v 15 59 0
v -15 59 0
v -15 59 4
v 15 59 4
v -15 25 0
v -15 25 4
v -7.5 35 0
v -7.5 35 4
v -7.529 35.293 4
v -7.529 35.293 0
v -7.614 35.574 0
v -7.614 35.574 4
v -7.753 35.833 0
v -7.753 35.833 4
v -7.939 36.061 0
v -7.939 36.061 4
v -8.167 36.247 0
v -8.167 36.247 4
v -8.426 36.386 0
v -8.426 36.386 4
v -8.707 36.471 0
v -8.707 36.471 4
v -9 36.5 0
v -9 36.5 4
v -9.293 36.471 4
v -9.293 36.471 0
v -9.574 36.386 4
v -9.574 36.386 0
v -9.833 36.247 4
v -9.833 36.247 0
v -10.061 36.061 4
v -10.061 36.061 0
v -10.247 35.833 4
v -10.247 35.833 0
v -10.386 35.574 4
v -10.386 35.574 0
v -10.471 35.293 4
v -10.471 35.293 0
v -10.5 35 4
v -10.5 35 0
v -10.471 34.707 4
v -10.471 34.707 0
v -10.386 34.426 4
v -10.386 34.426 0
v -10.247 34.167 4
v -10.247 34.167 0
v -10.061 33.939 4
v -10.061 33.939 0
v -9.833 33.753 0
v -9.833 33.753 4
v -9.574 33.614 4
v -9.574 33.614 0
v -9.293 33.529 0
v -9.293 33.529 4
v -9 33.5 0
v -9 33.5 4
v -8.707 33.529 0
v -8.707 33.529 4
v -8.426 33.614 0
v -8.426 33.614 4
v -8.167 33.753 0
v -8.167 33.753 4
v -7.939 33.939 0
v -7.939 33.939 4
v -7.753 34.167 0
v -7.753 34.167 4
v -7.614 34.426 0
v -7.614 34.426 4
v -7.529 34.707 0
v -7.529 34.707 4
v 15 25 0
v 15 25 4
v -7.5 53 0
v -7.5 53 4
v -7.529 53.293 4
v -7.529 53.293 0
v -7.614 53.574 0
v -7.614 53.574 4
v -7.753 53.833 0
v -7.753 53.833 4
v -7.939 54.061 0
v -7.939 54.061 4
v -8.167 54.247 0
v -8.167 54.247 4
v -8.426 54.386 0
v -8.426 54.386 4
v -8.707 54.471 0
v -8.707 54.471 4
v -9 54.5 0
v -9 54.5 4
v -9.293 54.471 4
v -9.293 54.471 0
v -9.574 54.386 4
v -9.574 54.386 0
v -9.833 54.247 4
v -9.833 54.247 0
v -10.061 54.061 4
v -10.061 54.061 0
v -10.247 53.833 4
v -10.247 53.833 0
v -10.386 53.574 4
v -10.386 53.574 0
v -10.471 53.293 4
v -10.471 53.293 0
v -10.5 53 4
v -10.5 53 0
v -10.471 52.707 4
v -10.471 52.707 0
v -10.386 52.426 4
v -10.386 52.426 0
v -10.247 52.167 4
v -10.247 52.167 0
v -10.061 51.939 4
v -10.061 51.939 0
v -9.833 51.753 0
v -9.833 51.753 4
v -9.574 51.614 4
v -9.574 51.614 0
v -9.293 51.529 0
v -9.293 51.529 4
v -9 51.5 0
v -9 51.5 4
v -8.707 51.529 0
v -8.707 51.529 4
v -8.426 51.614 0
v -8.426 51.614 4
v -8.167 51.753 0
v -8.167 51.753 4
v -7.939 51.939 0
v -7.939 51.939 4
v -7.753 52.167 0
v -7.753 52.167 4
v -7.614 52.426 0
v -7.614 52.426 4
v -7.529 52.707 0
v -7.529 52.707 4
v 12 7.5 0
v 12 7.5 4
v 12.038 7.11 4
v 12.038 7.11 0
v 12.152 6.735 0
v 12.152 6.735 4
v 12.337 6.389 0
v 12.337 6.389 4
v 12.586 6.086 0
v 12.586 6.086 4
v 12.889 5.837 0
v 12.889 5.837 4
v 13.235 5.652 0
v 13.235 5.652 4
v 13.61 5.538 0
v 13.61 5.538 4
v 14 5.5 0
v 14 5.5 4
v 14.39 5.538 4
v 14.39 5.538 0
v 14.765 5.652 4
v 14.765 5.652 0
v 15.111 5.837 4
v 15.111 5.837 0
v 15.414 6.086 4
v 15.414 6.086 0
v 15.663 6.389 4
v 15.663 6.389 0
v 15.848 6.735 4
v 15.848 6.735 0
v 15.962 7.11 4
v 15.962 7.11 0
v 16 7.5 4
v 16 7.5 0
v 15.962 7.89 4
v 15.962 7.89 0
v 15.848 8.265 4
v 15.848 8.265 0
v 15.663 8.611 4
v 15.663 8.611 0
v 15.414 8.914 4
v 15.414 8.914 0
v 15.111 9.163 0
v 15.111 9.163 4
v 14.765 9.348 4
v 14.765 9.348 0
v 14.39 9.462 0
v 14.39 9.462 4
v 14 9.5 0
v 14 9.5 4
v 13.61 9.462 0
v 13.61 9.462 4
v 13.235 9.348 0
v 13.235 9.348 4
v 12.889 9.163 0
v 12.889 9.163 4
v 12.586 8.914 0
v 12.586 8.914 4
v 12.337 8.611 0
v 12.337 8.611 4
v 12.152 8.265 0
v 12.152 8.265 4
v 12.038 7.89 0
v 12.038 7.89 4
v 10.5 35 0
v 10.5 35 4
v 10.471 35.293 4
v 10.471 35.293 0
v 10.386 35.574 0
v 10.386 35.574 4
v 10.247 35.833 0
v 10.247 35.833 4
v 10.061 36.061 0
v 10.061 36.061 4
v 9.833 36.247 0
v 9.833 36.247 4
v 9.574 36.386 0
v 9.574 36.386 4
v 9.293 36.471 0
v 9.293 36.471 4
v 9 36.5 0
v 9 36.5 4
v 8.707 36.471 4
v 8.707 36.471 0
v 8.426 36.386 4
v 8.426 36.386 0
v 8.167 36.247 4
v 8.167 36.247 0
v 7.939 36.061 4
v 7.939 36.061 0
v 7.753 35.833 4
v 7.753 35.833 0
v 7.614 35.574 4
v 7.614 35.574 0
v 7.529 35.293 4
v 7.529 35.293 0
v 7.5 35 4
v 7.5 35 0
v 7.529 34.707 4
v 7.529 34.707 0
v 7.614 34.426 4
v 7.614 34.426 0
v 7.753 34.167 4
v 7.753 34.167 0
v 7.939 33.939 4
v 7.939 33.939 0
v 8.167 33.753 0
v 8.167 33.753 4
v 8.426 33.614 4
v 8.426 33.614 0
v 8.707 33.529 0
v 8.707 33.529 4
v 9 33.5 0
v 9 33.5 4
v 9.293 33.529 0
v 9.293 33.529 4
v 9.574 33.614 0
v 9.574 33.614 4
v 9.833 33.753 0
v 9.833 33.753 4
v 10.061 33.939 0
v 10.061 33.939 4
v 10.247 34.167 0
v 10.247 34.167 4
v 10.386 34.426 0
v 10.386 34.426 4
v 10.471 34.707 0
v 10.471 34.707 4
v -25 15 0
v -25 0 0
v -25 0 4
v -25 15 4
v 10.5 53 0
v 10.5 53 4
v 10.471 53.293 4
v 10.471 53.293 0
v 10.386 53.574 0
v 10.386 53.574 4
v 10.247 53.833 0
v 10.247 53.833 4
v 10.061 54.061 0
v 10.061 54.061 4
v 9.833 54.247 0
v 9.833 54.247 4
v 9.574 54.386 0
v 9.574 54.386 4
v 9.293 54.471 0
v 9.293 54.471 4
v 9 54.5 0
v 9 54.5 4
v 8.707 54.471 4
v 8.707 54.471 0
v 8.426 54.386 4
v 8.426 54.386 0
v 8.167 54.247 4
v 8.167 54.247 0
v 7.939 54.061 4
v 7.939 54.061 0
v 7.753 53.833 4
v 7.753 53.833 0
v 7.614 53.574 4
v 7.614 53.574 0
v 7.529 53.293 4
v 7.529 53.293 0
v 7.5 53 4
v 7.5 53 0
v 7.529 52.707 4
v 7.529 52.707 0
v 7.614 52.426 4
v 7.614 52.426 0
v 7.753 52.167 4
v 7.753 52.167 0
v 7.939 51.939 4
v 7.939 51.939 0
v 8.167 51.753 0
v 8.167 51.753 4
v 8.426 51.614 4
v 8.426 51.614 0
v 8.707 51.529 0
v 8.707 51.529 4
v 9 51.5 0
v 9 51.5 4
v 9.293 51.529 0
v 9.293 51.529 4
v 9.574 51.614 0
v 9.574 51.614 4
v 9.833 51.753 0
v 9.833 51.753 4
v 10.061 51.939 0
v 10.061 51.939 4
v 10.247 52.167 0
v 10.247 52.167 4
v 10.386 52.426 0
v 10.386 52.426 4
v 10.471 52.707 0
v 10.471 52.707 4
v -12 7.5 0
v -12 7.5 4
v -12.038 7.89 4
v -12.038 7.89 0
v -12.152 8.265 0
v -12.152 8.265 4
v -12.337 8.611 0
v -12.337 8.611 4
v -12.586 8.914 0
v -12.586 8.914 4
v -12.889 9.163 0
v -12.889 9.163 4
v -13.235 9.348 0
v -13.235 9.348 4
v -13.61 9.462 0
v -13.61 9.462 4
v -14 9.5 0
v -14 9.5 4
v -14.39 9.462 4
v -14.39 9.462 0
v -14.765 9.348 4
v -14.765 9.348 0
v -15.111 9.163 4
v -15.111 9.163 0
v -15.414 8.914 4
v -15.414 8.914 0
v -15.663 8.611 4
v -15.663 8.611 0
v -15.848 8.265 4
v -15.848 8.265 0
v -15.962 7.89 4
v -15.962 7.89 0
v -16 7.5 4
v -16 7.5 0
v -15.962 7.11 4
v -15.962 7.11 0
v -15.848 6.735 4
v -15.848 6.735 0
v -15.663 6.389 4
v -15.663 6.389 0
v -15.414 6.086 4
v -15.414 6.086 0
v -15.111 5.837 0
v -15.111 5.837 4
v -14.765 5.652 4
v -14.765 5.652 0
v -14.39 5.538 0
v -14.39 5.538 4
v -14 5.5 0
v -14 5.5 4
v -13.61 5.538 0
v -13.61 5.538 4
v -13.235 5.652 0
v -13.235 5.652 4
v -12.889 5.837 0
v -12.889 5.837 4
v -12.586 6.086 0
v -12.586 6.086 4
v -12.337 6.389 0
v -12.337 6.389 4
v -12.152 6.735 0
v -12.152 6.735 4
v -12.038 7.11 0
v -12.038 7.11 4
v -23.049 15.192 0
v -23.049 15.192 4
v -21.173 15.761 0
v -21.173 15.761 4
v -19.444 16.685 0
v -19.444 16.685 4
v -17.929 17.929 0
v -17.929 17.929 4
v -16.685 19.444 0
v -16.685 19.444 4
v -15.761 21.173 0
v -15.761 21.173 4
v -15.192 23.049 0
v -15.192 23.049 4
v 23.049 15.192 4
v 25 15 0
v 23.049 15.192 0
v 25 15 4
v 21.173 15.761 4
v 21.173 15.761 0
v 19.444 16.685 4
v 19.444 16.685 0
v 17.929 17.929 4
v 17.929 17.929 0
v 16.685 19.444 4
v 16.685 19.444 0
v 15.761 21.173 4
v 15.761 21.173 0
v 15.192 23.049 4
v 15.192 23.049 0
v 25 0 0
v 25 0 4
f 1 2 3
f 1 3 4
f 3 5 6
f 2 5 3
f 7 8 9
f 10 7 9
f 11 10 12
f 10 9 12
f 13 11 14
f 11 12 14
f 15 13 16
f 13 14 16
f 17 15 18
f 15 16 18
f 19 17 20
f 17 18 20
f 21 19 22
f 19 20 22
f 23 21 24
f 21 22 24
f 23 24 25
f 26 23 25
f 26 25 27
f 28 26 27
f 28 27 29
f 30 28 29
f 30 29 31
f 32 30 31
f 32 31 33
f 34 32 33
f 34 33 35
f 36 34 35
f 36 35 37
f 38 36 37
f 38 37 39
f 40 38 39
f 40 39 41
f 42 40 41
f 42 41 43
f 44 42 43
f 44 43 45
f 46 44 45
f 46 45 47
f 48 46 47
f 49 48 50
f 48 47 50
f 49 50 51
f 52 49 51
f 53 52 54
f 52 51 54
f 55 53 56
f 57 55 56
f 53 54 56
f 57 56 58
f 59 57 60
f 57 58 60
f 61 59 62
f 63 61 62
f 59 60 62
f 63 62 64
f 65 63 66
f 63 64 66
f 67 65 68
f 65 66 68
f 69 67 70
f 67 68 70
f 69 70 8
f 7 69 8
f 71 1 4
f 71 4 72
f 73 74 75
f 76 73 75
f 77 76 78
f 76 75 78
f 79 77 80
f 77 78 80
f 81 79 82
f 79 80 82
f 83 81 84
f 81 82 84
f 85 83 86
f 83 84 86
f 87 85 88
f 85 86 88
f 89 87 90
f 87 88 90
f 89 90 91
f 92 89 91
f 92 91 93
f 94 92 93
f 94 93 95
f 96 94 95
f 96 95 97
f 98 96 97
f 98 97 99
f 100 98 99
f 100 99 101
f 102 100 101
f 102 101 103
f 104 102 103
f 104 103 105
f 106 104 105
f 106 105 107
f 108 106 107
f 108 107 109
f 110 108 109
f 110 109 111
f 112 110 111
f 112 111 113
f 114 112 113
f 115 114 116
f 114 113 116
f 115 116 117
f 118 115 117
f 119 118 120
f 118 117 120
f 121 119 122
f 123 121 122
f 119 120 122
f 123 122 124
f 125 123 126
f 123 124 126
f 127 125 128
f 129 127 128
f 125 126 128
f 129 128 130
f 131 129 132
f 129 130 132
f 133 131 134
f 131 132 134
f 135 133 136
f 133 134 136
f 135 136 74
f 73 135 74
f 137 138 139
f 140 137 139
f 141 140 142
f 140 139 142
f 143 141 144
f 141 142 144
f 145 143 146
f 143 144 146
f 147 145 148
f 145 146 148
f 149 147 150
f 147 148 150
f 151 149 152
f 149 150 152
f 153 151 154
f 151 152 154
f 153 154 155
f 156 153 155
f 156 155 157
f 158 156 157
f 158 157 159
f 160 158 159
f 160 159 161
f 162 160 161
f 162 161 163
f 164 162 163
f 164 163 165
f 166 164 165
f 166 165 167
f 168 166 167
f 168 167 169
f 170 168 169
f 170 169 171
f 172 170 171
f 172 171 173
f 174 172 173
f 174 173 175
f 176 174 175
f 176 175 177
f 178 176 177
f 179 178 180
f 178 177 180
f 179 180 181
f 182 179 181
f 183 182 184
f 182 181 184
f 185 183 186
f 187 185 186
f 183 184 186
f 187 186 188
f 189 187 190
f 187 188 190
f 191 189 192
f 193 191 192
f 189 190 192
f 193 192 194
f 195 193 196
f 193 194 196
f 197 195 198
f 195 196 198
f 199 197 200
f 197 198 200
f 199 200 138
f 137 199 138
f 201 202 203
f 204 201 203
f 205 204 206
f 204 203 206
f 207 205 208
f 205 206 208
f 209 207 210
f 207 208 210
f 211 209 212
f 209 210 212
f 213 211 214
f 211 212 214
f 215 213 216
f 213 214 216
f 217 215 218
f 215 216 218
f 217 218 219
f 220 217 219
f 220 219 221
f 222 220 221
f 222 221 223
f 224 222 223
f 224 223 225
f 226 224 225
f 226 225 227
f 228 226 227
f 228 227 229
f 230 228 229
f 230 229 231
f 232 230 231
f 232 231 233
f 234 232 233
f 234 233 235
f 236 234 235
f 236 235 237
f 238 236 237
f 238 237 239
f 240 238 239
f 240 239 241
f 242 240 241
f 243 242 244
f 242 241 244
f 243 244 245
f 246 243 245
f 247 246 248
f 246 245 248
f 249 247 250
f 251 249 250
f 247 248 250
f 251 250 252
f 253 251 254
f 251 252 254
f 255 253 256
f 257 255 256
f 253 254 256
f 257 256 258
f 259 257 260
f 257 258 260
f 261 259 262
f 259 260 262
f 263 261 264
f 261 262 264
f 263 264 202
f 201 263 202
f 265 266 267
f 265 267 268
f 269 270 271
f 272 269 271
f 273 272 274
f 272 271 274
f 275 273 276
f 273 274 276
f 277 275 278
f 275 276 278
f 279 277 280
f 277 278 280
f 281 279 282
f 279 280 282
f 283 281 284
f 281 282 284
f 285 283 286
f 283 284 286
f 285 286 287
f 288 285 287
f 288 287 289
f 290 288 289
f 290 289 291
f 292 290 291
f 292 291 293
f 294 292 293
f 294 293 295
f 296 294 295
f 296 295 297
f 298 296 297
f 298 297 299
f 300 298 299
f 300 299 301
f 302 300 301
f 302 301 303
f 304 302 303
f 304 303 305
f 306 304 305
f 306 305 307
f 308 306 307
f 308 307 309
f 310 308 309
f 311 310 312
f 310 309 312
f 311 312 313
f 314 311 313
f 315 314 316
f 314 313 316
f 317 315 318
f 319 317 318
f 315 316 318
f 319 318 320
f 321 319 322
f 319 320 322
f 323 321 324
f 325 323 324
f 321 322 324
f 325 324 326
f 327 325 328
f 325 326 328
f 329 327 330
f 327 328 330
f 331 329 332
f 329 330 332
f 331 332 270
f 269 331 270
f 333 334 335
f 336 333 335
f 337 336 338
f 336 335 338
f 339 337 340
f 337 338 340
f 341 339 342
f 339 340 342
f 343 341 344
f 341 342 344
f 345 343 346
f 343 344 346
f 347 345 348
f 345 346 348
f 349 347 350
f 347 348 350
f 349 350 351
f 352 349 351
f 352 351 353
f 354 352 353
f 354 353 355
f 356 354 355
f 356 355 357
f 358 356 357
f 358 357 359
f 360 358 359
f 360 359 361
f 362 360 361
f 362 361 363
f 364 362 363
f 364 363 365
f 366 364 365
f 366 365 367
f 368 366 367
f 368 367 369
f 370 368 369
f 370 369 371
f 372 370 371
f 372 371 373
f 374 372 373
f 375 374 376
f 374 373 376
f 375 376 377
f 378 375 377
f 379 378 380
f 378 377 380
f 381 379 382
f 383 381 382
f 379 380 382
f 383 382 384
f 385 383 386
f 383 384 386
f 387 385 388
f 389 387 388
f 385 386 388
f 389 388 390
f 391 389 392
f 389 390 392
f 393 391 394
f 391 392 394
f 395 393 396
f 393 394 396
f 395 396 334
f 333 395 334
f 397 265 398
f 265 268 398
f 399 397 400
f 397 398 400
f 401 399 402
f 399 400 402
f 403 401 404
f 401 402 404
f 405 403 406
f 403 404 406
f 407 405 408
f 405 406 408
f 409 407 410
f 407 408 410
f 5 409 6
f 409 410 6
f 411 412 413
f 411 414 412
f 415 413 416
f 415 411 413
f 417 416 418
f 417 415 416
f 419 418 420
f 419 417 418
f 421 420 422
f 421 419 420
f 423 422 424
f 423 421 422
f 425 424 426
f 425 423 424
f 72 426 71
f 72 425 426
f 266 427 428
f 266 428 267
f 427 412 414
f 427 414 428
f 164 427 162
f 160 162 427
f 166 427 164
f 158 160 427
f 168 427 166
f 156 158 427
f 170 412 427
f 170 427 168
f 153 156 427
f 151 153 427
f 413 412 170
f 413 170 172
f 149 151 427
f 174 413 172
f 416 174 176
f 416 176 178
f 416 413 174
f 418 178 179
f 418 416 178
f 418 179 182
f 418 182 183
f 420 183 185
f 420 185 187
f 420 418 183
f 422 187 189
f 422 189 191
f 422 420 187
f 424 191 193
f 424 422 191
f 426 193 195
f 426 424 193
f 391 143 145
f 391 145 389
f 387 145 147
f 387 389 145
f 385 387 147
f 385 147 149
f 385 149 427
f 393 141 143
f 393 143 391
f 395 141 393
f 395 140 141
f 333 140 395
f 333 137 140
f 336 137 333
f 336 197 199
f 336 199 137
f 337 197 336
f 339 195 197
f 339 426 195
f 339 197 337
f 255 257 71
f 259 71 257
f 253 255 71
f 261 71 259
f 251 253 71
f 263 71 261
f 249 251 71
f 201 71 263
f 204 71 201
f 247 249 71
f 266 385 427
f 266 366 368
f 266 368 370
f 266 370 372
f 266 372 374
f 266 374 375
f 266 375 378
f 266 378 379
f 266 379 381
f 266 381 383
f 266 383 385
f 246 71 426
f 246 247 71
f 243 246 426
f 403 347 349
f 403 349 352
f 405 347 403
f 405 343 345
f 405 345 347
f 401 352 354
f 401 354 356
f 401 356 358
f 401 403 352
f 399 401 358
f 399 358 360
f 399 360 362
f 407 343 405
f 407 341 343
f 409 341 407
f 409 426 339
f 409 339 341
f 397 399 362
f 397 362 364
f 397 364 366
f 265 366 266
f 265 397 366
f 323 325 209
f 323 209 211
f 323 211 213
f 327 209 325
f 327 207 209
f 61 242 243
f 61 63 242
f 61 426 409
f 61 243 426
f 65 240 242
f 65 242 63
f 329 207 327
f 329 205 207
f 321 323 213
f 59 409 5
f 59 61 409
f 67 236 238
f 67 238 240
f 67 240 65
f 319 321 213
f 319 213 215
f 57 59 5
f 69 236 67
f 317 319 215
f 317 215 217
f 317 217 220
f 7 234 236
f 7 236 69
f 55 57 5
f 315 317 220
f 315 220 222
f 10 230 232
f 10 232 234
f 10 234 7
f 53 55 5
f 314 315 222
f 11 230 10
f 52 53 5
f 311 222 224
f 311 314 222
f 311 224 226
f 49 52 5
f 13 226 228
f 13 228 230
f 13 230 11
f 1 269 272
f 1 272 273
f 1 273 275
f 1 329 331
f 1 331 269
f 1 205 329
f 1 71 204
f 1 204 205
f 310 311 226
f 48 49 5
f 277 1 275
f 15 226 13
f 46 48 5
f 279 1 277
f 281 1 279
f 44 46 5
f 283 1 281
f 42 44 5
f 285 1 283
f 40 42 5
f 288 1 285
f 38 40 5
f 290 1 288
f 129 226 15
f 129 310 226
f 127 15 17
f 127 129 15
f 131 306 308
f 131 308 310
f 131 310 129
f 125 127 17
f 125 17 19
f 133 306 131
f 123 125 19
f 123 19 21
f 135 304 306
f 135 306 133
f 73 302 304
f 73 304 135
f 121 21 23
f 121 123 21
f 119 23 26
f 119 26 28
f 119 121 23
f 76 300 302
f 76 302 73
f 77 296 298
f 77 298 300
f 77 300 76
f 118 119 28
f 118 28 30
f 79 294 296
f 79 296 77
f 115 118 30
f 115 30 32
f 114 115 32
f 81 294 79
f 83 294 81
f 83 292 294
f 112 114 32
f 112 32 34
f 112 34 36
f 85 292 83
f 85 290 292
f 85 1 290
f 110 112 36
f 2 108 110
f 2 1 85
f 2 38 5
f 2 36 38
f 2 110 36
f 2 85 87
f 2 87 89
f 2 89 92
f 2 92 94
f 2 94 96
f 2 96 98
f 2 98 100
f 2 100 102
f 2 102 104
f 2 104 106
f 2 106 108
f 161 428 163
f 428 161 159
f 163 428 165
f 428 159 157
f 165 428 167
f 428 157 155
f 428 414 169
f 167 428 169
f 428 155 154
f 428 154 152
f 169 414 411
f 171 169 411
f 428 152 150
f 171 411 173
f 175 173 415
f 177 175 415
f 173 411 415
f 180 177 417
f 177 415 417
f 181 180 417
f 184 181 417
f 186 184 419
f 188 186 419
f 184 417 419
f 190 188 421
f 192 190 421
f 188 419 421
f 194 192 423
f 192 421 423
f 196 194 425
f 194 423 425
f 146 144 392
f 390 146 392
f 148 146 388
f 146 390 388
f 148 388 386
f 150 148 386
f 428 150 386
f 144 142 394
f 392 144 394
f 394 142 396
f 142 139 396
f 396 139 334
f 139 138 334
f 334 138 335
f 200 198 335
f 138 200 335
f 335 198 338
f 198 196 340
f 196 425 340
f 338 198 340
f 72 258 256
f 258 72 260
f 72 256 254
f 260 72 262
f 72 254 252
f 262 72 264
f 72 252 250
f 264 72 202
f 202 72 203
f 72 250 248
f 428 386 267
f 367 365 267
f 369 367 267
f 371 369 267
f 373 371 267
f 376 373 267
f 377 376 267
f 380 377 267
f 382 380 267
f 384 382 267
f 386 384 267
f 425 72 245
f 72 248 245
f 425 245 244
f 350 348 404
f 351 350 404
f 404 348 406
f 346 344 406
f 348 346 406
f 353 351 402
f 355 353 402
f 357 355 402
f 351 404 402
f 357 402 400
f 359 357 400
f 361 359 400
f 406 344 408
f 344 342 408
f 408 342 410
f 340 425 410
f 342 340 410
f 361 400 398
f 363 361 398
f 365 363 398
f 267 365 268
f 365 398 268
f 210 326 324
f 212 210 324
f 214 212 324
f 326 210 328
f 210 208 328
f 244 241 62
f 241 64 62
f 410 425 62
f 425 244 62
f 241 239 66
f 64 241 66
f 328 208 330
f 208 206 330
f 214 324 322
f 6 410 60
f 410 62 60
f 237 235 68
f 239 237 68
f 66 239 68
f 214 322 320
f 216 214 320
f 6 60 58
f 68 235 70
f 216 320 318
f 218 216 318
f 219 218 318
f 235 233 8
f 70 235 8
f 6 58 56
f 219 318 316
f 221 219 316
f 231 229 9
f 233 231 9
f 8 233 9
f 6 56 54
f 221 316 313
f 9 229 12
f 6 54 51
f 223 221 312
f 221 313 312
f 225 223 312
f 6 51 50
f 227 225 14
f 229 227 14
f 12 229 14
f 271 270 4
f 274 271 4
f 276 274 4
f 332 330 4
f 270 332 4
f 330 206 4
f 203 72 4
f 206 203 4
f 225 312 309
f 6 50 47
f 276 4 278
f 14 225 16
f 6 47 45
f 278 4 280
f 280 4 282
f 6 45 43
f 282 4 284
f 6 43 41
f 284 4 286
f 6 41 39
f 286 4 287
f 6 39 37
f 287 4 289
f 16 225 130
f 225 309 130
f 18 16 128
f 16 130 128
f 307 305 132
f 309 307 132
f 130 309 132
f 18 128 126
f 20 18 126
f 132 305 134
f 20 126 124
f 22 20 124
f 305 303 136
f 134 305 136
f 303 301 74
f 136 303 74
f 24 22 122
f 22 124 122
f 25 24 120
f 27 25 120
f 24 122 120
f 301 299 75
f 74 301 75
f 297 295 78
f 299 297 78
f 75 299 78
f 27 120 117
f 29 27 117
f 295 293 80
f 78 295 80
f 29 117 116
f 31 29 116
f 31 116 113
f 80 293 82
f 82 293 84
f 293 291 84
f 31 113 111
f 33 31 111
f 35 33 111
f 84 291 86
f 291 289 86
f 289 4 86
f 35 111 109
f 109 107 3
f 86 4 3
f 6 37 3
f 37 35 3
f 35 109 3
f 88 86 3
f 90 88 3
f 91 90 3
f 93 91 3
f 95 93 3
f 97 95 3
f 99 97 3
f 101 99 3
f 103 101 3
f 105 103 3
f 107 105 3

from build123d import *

# Parameters (mm, degrees)
EXTRUDE_1_DEPTH     = 4
SKETCH_2_R          = 1.5
CUT_EXTRUDE_1_DEPTH = 65.202803677
SKETCH_3_R          = 2
CUT_EXTRUDE_2_DEPTH = 65.202803677
FILLET_1_R          = 10


with BuildPart() as part:
    # 草图1 → 凸台-拉伸1 (new body)
    with BuildSketch(Plane.XY):
        Polygon((25, 0), (-25, 0), (-25, 15), (-15, 15), (-15, 59), (15, 59), (15, 15), (25, 15), align=None)
    extrude(amount=EXTRUDE_1_DEPTH)

    # 草图2 → 切除-拉伸1 (cut, through all)
    with BuildSketch(Plane.XY.offset(4)):
        with Locations((-9, 53)):
            Circle(SKETCH_2_R)
        with Locations((-9, 35)):
            Circle(SKETCH_2_R)
        with Locations((9, 35)):
            Circle(SKETCH_2_R)
        with Locations((9, 53)):
            Circle(SKETCH_2_R)
    extrude(amount=-CUT_EXTRUDE_1_DEPTH, mode=Mode.SUBTRACT)

    # 草图3 → 切除-拉伸2 (cut, through all)
    with BuildSketch(Plane.XY.offset(4)):
        with Locations((-14, 7.5)):
            Circle(SKETCH_3_R)
        with Locations(Location((14, 7.5, 0), (0, 0, 180))):
            Circle(SKETCH_3_R)
    extrude(amount=-CUT_EXTRUDE_2_DEPTH, mode=Mode.SUBTRACT)

    # 圆角1
    fillet_1_edges = [part.edges().sort_by_distance(p)[0] for p in [
        (-15, 15, 2),
        (15, 15, 2),
    ]]
    fillet(fillet_1_edges, radius=FILLET_1_R - 0.0001)  # a hair under: the kernel refuses the full size


solid = part.part
